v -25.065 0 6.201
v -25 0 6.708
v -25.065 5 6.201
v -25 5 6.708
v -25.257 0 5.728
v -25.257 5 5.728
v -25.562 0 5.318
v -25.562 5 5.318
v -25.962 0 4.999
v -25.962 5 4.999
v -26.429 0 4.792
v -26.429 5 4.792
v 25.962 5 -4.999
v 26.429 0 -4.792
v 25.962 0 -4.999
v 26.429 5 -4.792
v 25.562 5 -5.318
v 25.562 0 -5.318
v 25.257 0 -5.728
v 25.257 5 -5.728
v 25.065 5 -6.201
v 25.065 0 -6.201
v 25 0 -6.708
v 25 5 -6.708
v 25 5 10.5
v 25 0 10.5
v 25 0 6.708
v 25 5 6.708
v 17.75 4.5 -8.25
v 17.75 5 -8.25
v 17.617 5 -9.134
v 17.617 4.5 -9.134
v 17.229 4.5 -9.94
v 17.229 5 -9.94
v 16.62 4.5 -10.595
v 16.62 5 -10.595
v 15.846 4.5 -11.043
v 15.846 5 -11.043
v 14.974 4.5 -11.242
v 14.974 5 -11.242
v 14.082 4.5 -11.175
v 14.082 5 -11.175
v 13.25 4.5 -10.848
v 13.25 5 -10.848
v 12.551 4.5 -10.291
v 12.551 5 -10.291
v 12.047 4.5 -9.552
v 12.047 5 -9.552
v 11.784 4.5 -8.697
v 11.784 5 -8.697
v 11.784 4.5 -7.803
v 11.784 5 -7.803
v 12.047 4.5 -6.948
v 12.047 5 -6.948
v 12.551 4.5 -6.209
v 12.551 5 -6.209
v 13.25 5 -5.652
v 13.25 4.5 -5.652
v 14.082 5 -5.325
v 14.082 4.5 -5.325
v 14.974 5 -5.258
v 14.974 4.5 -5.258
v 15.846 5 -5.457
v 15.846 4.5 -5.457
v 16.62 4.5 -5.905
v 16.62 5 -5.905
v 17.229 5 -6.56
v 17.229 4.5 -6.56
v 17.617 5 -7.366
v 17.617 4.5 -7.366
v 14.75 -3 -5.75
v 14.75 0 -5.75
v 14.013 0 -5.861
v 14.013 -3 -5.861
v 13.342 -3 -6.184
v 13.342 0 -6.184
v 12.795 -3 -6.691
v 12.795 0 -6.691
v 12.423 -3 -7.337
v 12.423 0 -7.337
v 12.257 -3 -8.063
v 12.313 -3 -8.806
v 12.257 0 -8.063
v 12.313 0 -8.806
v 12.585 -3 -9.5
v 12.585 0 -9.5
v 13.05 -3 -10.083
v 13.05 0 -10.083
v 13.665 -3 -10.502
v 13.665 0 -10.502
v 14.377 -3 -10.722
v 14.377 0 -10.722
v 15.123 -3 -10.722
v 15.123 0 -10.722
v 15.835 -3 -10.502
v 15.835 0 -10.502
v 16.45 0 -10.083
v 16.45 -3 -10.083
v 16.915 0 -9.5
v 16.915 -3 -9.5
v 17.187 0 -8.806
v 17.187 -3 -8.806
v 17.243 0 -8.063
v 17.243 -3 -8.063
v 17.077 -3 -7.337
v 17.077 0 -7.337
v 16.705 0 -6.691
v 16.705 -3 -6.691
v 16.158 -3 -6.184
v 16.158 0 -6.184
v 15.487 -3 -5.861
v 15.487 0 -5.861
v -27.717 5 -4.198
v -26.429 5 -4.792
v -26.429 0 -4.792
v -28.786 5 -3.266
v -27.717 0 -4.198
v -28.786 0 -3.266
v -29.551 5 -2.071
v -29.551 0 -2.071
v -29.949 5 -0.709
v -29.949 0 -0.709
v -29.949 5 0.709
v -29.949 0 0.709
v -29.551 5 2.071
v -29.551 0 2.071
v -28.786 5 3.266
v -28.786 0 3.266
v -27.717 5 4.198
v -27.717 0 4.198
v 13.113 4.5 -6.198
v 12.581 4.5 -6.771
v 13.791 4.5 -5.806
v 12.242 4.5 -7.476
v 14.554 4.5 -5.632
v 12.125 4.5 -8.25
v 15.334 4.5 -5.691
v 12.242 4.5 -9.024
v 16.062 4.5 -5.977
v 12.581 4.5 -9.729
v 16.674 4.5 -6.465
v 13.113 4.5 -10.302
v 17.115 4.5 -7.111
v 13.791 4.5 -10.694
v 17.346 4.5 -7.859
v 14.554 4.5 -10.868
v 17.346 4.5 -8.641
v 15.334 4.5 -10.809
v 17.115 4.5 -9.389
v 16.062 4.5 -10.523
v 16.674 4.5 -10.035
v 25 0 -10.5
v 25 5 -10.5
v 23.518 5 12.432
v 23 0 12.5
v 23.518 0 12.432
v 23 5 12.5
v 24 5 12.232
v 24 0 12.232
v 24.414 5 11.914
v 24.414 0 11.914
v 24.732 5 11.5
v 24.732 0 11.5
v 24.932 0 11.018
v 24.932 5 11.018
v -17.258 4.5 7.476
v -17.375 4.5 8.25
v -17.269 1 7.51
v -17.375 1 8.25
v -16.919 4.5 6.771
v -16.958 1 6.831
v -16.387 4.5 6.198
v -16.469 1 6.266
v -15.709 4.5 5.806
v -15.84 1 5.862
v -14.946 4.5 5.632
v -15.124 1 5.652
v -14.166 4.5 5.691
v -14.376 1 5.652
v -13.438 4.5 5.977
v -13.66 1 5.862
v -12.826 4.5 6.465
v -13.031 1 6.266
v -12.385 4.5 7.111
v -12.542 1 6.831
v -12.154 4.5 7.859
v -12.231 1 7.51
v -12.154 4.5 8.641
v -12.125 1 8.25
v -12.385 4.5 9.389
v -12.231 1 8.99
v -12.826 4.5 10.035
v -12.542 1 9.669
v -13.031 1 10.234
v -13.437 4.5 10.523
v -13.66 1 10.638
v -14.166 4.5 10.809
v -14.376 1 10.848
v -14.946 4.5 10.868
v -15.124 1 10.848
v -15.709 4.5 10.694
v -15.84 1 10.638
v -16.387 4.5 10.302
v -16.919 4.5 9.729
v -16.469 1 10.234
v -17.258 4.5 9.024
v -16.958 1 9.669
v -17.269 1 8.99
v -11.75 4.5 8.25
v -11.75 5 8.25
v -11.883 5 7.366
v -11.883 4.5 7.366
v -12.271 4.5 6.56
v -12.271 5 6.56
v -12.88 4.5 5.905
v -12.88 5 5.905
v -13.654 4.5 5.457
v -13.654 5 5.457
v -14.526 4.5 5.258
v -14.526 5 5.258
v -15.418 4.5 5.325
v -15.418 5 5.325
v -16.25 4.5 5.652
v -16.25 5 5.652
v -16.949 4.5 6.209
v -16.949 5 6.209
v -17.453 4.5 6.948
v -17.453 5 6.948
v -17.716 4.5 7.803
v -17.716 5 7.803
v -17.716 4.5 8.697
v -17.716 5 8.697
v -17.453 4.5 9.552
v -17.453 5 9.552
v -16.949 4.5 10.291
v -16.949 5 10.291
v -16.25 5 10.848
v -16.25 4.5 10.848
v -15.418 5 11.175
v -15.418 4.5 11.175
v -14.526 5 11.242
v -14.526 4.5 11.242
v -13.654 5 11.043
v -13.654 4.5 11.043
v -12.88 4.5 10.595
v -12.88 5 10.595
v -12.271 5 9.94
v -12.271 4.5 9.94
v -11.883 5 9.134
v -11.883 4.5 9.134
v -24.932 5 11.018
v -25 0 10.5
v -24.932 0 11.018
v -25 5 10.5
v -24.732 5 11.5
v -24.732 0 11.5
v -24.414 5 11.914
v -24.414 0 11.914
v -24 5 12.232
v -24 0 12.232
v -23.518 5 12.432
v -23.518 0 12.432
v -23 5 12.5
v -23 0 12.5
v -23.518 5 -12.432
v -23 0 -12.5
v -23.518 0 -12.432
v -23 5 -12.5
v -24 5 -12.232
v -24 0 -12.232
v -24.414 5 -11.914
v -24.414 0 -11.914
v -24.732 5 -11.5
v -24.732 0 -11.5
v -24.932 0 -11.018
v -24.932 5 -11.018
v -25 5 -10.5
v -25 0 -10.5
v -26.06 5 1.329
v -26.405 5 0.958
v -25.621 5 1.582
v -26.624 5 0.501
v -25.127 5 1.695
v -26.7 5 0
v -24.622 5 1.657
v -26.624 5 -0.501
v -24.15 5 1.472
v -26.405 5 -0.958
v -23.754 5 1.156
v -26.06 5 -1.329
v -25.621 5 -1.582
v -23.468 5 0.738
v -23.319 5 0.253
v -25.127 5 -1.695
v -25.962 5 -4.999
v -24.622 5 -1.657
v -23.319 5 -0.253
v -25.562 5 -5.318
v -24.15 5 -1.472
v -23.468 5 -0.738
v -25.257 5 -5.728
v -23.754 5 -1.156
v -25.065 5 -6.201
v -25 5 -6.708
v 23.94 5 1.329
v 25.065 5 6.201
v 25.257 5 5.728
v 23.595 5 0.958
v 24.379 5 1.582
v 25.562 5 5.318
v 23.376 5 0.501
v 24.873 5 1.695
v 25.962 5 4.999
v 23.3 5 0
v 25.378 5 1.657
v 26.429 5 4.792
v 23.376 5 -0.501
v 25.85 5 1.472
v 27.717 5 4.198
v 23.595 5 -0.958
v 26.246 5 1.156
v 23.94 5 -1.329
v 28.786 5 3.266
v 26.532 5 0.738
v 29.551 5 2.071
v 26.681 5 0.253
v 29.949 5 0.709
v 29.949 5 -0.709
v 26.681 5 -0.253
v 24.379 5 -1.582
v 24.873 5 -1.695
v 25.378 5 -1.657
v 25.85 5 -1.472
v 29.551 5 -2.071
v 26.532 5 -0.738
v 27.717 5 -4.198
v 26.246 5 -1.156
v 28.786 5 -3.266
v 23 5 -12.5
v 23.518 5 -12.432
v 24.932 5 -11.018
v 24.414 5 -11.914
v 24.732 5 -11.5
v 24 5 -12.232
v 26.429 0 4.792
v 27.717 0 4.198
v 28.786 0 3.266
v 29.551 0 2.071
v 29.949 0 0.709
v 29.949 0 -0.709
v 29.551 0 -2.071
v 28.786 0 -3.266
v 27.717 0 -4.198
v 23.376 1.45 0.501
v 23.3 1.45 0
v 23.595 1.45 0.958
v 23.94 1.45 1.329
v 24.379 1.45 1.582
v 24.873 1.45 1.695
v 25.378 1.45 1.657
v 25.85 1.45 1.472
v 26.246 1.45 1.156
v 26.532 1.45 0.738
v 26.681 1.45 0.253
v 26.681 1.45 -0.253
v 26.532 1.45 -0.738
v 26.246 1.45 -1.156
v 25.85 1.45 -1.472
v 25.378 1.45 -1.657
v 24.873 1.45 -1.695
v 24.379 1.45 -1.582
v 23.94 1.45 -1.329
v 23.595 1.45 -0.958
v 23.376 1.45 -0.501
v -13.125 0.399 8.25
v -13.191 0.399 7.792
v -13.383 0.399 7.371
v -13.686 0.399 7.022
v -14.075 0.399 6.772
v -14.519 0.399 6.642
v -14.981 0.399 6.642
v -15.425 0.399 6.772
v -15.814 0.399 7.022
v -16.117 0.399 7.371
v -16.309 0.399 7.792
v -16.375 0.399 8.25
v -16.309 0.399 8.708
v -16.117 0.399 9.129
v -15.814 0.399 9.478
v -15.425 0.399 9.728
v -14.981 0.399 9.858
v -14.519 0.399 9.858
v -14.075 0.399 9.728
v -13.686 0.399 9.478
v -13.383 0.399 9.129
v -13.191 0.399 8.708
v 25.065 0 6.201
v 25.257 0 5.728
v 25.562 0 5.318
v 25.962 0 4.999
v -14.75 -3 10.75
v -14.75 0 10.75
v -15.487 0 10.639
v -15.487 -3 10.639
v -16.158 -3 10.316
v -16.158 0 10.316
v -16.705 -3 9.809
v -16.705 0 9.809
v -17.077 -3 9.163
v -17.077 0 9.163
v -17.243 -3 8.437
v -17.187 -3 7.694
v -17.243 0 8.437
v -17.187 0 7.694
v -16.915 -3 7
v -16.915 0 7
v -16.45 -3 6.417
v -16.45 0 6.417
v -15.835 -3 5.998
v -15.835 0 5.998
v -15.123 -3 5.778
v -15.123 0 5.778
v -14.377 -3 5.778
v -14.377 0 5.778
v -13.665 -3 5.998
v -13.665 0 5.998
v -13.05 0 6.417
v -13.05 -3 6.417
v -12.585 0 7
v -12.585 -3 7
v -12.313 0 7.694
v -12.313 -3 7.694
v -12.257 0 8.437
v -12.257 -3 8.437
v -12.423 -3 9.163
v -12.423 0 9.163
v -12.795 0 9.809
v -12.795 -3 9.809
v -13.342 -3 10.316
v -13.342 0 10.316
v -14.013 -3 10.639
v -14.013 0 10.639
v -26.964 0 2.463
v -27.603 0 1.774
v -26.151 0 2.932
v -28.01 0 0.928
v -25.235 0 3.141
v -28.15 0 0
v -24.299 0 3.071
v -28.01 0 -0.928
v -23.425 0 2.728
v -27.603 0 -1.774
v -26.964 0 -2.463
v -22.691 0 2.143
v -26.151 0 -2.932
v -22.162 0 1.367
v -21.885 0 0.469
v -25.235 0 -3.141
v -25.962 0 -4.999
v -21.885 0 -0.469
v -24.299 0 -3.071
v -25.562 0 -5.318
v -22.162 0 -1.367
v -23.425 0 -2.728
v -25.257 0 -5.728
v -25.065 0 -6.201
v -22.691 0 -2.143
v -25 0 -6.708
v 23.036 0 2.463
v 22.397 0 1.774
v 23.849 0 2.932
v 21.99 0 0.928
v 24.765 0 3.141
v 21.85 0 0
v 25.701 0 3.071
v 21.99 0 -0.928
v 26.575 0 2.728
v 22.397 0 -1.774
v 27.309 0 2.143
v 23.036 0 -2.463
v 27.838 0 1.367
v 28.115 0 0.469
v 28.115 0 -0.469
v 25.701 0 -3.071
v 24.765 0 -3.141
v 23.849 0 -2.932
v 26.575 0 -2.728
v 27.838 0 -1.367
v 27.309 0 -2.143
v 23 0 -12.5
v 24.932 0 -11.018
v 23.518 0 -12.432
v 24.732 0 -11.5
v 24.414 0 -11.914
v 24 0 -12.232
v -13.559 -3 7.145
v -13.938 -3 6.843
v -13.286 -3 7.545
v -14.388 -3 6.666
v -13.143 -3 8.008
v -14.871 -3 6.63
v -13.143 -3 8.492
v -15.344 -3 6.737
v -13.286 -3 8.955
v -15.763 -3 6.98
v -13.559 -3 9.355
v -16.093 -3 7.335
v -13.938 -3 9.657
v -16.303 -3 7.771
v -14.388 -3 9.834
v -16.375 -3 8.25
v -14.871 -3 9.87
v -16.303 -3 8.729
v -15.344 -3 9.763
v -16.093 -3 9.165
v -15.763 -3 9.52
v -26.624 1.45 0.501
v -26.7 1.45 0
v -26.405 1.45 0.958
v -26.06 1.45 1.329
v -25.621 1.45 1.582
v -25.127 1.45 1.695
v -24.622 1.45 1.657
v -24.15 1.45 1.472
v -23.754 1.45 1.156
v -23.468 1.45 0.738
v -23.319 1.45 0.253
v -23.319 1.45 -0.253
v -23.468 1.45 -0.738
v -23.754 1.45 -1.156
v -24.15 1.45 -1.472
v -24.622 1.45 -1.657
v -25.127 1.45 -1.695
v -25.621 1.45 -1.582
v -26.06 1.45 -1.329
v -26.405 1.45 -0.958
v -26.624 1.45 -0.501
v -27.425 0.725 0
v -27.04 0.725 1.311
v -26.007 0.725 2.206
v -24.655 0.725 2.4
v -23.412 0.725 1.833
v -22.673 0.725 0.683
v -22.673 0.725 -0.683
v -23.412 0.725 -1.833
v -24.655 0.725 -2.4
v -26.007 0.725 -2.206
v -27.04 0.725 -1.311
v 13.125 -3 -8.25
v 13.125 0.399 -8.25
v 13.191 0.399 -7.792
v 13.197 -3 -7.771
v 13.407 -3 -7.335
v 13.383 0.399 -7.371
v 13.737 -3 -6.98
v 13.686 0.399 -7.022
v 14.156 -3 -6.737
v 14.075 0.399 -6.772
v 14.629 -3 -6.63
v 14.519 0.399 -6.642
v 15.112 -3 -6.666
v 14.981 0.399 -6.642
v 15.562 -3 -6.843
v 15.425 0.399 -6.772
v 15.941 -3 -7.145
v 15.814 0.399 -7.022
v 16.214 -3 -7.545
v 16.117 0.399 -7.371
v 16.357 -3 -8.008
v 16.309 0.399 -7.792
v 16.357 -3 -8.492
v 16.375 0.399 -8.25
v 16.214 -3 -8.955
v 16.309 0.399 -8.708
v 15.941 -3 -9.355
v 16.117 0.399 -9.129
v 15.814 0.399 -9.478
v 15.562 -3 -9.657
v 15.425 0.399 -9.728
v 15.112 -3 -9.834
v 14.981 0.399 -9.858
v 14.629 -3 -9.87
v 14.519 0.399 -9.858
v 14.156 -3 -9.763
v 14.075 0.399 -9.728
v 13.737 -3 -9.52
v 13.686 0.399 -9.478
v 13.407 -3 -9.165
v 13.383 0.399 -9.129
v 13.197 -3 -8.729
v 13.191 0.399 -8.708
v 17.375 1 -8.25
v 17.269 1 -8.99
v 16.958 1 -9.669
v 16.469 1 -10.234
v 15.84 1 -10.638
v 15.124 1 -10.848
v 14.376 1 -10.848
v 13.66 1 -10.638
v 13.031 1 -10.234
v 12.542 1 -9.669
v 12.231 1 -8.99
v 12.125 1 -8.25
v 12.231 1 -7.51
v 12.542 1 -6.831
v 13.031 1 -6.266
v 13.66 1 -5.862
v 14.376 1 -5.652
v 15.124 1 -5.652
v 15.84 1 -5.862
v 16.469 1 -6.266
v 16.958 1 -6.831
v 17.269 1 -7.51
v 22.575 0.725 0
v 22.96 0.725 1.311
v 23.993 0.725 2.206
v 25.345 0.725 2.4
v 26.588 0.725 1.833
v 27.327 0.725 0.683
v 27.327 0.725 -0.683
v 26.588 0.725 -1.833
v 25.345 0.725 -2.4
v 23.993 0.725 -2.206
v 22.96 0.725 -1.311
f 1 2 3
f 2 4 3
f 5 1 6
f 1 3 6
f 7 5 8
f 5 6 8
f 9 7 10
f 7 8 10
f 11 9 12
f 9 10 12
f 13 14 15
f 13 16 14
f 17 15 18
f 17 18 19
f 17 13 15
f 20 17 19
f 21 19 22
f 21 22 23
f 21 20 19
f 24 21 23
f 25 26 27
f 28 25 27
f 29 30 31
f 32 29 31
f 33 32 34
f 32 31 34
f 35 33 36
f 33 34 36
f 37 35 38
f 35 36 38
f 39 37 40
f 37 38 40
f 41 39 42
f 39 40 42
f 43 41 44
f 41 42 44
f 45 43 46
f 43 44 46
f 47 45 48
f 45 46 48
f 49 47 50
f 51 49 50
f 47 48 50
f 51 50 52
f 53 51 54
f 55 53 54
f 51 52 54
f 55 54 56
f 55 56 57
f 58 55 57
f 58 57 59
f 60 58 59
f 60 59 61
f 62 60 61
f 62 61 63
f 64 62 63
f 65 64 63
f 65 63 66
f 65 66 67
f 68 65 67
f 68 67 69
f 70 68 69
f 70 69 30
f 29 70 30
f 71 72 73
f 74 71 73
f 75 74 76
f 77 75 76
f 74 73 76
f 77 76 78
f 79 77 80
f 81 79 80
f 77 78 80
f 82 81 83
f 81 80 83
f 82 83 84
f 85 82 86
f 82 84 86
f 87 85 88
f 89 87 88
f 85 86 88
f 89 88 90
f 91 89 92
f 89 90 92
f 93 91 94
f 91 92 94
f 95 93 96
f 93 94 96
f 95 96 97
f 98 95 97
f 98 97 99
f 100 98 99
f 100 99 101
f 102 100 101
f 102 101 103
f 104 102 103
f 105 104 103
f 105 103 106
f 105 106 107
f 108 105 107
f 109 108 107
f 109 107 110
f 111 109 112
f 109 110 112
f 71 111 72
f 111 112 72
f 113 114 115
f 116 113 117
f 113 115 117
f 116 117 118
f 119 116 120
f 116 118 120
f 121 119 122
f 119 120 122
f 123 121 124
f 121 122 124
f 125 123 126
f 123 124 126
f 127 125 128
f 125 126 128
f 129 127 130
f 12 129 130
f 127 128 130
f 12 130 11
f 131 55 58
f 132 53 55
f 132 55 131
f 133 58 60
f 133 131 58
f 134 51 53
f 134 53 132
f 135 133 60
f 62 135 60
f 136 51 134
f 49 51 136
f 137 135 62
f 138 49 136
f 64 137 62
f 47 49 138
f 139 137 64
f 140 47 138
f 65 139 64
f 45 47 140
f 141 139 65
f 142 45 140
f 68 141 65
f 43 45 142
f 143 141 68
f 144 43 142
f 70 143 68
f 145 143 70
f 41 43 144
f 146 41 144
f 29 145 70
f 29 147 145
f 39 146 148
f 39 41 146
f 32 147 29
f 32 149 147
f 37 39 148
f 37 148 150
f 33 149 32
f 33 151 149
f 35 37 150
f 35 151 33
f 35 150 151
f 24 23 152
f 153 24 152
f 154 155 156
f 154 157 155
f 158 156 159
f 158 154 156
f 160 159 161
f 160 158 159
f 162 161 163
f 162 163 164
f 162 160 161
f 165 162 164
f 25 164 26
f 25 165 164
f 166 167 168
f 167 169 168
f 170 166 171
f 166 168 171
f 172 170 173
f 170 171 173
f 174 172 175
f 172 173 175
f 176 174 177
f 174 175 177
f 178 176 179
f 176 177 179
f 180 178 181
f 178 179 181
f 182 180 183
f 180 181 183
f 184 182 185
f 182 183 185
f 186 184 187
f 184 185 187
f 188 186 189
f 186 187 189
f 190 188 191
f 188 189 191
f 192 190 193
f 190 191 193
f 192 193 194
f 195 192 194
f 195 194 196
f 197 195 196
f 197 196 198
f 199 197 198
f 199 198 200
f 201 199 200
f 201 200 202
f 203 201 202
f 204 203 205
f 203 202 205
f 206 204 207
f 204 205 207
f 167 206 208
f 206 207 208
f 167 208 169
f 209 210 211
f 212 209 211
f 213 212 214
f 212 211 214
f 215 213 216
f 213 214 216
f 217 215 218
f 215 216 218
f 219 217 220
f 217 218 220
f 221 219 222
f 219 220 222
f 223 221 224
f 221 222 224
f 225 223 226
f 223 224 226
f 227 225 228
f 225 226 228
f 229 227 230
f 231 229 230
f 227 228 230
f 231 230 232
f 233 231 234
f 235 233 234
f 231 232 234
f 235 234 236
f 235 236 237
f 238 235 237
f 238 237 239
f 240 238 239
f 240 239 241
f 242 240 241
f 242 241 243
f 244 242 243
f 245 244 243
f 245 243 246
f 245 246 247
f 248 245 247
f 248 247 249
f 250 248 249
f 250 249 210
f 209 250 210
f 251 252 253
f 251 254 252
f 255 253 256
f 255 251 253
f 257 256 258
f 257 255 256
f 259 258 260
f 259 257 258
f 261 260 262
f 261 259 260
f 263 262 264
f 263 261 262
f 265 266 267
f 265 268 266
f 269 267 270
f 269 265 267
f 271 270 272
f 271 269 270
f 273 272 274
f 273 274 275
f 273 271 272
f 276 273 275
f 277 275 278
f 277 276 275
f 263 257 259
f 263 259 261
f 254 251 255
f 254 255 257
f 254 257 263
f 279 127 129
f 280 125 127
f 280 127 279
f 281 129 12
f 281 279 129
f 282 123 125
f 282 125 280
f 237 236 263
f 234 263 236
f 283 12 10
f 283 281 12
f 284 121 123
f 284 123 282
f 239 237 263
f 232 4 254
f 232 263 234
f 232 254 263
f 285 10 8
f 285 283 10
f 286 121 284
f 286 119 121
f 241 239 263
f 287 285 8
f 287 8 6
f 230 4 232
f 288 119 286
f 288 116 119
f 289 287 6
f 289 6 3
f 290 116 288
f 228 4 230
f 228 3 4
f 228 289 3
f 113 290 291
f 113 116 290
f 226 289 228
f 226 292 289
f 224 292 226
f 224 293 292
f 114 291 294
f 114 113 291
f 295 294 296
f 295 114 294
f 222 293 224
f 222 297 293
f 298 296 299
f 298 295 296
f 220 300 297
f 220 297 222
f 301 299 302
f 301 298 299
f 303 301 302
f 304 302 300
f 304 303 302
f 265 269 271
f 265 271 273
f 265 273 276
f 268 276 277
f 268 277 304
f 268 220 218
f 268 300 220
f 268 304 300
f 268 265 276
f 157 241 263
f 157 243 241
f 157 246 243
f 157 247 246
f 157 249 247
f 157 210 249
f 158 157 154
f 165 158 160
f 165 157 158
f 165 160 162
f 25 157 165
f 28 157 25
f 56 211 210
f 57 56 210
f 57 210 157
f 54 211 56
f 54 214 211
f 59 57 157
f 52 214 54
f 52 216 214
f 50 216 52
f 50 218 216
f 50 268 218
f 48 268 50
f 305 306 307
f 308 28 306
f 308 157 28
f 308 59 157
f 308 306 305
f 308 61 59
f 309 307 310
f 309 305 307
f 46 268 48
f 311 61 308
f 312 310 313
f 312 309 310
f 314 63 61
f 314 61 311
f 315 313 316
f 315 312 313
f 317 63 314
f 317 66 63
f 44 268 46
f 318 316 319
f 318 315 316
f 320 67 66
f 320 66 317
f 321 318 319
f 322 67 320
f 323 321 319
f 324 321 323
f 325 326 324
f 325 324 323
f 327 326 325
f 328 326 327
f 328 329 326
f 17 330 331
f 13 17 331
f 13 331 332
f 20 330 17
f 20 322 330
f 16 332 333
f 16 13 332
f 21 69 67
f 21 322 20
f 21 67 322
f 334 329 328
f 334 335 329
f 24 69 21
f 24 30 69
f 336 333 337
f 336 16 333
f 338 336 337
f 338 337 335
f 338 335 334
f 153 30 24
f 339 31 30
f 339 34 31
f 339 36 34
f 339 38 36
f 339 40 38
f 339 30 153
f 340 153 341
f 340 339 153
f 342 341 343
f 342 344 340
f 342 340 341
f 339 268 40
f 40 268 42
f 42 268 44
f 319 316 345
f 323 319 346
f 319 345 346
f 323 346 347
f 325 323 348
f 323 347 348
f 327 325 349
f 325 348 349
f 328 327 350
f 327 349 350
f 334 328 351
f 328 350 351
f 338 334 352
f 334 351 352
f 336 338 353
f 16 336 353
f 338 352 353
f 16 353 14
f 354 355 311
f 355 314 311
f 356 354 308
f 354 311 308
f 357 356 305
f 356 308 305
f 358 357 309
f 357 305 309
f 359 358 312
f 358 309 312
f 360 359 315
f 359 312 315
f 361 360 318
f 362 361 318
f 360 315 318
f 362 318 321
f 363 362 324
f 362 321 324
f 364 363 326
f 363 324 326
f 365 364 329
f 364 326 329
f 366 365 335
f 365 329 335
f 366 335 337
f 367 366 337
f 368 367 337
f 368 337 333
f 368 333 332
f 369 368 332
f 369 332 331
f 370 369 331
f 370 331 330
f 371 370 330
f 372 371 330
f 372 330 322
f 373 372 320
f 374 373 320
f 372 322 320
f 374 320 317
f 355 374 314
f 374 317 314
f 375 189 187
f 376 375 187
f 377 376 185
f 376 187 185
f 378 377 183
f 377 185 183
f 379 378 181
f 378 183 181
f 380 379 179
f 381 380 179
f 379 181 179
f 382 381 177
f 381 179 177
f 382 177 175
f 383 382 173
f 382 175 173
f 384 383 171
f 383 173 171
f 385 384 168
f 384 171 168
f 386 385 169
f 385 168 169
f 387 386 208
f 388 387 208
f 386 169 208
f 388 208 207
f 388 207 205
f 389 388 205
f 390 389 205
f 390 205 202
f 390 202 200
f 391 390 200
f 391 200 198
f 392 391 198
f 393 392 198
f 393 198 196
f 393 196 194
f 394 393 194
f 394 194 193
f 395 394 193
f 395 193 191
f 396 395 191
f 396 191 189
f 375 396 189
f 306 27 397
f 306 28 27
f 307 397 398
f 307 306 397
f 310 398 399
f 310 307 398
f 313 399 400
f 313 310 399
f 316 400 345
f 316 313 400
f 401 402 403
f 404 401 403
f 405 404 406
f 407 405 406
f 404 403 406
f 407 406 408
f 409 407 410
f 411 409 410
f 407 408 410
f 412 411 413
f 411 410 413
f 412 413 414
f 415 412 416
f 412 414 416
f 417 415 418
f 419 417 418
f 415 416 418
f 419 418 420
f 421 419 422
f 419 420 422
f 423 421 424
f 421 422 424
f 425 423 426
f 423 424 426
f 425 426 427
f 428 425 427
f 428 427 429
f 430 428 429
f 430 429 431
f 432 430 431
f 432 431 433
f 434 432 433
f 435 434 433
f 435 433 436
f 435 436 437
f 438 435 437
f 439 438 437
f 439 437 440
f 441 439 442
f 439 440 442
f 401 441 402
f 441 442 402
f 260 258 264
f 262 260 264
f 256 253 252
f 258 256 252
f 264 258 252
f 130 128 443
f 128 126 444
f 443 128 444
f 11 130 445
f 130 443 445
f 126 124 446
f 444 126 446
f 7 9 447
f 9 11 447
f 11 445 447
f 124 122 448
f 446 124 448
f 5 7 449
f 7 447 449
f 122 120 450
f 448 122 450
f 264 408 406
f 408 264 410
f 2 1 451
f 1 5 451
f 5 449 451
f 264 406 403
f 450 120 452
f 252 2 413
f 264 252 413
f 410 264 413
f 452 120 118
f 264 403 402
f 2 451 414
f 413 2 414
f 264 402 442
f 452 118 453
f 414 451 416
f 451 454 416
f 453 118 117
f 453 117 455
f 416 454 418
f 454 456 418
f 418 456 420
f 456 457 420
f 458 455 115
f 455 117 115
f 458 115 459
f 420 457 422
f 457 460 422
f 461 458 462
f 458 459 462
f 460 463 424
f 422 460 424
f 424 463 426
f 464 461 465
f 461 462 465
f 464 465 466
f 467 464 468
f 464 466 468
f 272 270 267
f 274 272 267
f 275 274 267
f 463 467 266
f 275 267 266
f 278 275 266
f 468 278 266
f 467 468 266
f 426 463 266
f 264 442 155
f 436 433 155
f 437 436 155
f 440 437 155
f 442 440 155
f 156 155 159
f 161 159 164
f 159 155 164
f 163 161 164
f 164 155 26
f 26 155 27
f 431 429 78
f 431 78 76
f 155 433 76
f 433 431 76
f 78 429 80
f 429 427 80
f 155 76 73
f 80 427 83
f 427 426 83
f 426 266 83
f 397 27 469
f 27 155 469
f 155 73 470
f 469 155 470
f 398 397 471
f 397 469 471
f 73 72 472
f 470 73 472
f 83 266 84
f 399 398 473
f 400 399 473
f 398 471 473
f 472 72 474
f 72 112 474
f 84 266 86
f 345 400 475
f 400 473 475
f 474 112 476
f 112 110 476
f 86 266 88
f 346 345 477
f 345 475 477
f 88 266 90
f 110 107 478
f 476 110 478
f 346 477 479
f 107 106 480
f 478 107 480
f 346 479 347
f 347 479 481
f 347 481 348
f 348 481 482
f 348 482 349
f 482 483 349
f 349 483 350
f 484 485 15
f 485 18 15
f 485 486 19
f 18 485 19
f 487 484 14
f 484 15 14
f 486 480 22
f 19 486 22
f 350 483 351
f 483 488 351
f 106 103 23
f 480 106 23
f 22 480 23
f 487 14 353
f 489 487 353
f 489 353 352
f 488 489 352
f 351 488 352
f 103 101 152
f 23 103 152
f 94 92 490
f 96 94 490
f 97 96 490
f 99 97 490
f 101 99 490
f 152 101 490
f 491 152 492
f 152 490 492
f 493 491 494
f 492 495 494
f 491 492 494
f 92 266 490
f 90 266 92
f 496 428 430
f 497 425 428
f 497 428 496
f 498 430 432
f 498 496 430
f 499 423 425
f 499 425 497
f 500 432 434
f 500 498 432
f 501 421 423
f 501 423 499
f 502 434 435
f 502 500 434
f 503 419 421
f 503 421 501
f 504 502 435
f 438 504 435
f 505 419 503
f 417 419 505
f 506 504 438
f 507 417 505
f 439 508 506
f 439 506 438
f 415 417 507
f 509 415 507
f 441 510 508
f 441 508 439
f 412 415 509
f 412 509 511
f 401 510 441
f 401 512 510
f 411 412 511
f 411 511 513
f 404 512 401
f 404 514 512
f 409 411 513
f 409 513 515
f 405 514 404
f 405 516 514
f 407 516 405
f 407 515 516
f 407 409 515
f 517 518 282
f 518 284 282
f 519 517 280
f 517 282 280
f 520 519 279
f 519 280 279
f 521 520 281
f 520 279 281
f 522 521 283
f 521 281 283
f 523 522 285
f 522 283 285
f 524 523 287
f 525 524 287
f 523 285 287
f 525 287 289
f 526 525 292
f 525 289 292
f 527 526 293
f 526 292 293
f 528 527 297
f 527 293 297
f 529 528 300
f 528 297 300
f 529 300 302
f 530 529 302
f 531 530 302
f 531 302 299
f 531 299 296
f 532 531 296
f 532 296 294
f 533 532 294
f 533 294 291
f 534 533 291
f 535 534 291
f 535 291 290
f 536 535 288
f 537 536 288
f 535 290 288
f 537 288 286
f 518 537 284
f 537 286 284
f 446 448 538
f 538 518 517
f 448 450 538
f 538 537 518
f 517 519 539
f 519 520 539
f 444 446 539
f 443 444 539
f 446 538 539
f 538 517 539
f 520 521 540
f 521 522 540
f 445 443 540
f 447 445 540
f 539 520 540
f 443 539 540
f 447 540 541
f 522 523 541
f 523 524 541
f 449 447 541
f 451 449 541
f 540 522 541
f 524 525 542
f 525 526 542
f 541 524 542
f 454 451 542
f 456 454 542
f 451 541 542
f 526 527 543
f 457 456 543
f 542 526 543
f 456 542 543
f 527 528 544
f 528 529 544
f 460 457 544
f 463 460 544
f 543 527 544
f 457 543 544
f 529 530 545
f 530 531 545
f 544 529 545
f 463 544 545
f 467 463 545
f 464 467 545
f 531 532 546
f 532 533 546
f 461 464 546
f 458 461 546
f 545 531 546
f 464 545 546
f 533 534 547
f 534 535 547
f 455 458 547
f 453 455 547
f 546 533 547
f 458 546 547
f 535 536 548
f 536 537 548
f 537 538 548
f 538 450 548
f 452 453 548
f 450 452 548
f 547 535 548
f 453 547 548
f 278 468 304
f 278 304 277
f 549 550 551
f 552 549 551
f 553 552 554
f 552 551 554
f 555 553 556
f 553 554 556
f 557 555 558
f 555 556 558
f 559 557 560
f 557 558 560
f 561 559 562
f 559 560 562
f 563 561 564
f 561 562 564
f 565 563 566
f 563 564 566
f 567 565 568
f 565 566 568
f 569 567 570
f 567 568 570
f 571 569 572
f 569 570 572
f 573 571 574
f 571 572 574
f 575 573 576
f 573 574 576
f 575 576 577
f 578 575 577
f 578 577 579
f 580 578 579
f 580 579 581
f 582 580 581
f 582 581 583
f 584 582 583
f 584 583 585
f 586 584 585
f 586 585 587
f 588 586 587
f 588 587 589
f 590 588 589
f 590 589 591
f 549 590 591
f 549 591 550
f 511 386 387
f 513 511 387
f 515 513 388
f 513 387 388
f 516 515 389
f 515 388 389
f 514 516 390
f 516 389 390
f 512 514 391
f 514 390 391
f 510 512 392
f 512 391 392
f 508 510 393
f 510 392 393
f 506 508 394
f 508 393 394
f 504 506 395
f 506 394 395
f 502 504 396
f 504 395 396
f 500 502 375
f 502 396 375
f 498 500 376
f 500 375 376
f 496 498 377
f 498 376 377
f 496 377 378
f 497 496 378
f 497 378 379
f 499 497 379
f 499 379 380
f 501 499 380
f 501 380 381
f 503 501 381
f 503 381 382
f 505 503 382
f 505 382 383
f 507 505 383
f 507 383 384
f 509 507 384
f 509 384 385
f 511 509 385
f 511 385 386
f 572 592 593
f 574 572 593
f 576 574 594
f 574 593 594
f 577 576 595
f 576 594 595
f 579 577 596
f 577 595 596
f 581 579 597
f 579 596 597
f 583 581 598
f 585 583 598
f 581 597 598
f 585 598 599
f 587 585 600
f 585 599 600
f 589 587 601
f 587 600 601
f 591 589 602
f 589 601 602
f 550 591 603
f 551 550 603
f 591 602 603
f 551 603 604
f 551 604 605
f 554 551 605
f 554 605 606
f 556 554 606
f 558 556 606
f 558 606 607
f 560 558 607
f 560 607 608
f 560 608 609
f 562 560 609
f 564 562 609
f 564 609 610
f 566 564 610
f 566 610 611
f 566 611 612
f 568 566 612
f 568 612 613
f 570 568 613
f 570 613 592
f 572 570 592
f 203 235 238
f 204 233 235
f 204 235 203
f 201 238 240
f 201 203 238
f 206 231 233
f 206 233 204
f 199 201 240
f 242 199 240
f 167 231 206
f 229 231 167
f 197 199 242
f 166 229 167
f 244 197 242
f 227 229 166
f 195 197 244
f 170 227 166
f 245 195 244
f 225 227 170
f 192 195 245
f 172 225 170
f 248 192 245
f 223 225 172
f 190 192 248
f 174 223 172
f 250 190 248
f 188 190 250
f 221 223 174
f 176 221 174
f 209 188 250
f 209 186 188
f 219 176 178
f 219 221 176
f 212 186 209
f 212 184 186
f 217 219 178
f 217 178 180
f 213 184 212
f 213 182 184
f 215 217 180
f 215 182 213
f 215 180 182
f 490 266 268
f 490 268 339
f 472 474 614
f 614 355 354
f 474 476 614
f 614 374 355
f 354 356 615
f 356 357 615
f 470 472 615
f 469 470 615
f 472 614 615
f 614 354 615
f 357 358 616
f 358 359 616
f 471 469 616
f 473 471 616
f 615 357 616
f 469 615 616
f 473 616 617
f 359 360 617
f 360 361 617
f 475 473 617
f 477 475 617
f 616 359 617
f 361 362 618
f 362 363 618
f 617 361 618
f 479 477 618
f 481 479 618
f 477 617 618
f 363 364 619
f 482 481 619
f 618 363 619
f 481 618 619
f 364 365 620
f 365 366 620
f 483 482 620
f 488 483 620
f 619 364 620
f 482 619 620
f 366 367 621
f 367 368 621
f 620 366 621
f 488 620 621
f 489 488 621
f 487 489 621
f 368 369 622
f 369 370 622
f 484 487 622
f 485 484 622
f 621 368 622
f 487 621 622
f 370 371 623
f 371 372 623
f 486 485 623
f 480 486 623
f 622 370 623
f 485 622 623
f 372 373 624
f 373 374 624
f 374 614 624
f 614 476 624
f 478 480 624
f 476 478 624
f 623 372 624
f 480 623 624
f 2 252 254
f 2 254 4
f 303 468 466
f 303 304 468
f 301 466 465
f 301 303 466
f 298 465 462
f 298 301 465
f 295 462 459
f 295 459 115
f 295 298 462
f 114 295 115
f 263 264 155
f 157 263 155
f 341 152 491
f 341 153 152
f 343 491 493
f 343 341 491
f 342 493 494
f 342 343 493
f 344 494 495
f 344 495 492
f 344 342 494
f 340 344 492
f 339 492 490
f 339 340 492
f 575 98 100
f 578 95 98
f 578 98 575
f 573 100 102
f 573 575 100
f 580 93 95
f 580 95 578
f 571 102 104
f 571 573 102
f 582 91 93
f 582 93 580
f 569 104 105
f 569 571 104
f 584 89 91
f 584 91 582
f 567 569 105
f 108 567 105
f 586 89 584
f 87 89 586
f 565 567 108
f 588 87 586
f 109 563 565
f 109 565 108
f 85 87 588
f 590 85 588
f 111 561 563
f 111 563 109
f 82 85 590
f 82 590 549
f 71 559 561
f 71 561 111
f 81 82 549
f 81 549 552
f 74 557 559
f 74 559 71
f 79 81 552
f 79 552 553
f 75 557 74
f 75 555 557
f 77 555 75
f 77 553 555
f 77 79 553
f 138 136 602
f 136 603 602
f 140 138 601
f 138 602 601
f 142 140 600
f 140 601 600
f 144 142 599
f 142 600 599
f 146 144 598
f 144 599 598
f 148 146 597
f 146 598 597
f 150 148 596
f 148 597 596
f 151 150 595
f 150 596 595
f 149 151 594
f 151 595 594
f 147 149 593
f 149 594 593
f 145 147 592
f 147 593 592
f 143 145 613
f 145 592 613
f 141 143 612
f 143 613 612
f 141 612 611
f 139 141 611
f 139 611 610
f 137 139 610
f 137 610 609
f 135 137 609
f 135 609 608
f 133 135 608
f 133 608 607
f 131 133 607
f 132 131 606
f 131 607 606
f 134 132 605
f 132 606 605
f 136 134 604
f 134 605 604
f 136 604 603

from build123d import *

# Parameters (mm, degrees)
SKETCH1_W                                       = 50
SKETCH1_H                                       = 7.5
BOSS_EXTRUDE1_DEPTH                             = 5
FILLET1_R                                       = 2
SKETCH2_R                                       = 2.5
BOSS_EXTRUDE2_DEPTH                             = 3
CBORE_FOR_M3_SHCS1_D                            = 5.25
CBORE_FOR_M3_SHCS1_DEPTH                        = 4
CBORE_FOR_M3_SHCS1_CBORE_D                      = 6
CBORE_FOR_M3_SHCS1_CBORE_DEPTH                  = 0.5
CBORE_FOR_M3_SHCS1_TIP                          = 1.577259125
CSK_FOR_M3_FLAT_HEAD_MACHINE_SCREW1_D           = 3.4
CSK_FOR_M3_FLAT_HEAD_MACHINE_SCREW1_CSINK_D     = 6.3
CSK_FOR_M3_FLAT_HEAD_MACHINE_SCREW1_CSINK_ANGLE = 90
M3_CLEARANCE_HOLE1_D                            = 3.25
M3_CLEARANCE_HOLE1_DEPTH                        = 4
M3_CLEARANCE_HOLE1_TIP                          = 0.976398506


with BuildPart() as part:
    # Sketch1 → Boss-Extrude1 (new body)
    with BuildSketch(Plane(origin=(0, 0, 0), x_dir=(1, 0, 0), z_dir=(0, 1, 0))):
        with Locations((0, -8.75)):
            Rectangle(SKETCH1_W, SKETCH1_H)
        with BuildLine():
            Line((-25, 2.625), (-25, 5))
            ThreePointArc((-25, 5), (-30, 0), (-25, -5))
            Line((-25, -5), (-25, -2.625))
            ThreePointArc((-25, -2.625), (-27.625, 0), (-25, 2.625))
        make_face()
        with BuildLine():
            Line((25, 5), (-25, 5))
            Line((-25, 5), (-25, 2.625))
            ThreePointArc((-25, 2.625), (-23.143844699, 1.856155301), (-22.375, 0))
            ThreePointArc((-22.375, 0), (-23.143844699, -1.856155301), (-25, -2.625))
            Line((-25, -2.625), (-25, -5))
            Line((-25, -5), (25, -5))
            Line((25, -5), (25, -2.625))
            ThreePointArc((25, -2.625), (22.375, 0), (25, 2.625))
            Line((25, 2.625), (25, 5))
        make_face()
        with Locations((0, 8.75)):
            Rectangle(SKETCH1_W, SKETCH1_H)
        with BuildLine():
            ThreePointArc((25, -5), (30, 0), (25, 5))
            Line((25, 5), (25, 2.625))
            ThreePointArc((25, 2.625), (26.856155301, 1.856155301), (27.625, 0))
            ThreePointArc((27.625, 0), (26.856155301, -1.856155301), (25, -2.625))
            Line((25, -2.625), (25, -5))
        make_face()
        with BuildLine():
            ThreePointArc((-22.375, 0), (-23.143844699, 1.856155301), (-25, 2.625))
            Line((-25, 2.625), (-25, -2.625))
            ThreePointArc((-25, -2.625), (-23.143844699, -1.856155301), (-22.375, 0))
        make_face()
        with BuildLine():
            Line((-25, -2.625), (-25, 2.625))
            ThreePointArc((-25, 2.625), (-27.625, 0), (-25, -2.625))
        make_face()
        with BuildLine():
            ThreePointArc((27.625, 0), (26.856155301, 1.856155301), (25, 2.625))
            Line((25, 2.625), (25, -2.625))
            ThreePointArc((25, -2.625), (26.856155301, -1.856155301), (27.625, 0))
        make_face()
        with BuildLine():
            Line((25, -2.625), (25, 2.625))
            ThreePointArc((25, 2.625), (22.375, 0), (25, -2.625))
        make_face()
    extrude(amount=BOSS_EXTRUDE1_DEPTH)

    # Fillet1
    fillet1_edges = [part.edges().sort_by_distance(p)[0] for p in [
        (25, 2.5, 12.5),
        (-25, 2.5, 12.5),
        (-25, 2.5, 5),
        (-25, 2.5, -5),
        (-25, 2.5, -12.5),
        (25, 2.5, -12.5),
        (25, 2.5, -5),
        (25, 2.5, 5),
    ]]
    fillet(fillet1_edges, radius=FILLET1_R)

    # Sketch2 → Boss-Extrude2 (add)
    with BuildSketch(Plane.XZ):
        with Locations(Location((-14.75, 8.25, 0), (0, 0, 90))):
            Circle(SKETCH2_R)
        with Locations(Location((14.75, -8.25, 0), (0, 0, 90))):
            Circle(SKETCH2_R)
    extrude(amount=BOSS_EXTRUDE2_DEPTH)

    # CBORE for M3 SHCS1
    with Locations(Plane(origin=(0, 5, 0), x_dir=(1, 0, 0), z_dir=(0, 1, 0))):
        with Locations((-14.75, -8.25), (14.75, 8.25)):
            CounterBoreHole(CBORE_FOR_M3_SHCS1_D / 2, CBORE_FOR_M3_SHCS1_CBORE_D / 2, CBORE_FOR_M3_SHCS1_CBORE_DEPTH, depth=CBORE_FOR_M3_SHCS1_DEPTH)
            with Locations((0, 0, -(CBORE_FOR_M3_SHCS1_DEPTH + CBORE_FOR_M3_SHCS1_TIP / 2))):  # 118° drill point
                Cone(0, CBORE_FOR_M3_SHCS1_D / 2, CBORE_FOR_M3_SHCS1_TIP, mode=Mode.SUBTRACT)

    # CSK for M3 Flat Head Machine Screw1 (through all)
    with Locations(Plane.XZ):
        with Locations((-25, 0), (25, 0)):
            CounterSinkHole(CSK_FOR_M3_FLAT_HEAD_MACHINE_SCREW1_D / 2, CSK_FOR_M3_FLAT_HEAD_MACHINE_SCREW1_CSINK_D / 2, counter_sink_angle=CSK_FOR_M3_FLAT_HEAD_MACHINE_SCREW1_CSINK_ANGLE)

    # M3 Clearance Hole1
    with Locations(Plane.XZ.offset(3)):
        with Locations((-14.75, 8.25), (14.75, -8.25)):
            Hole(M3_CLEARANCE_HOLE1_D / 2, depth=M3_CLEARANCE_HOLE1_DEPTH)
            with Locations((0, 0, -(M3_CLEARANCE_HOLE1_DEPTH + M3_CLEARANCE_HOLE1_TIP / 2))):  # 118° drill point
                Cone(0, M3_CLEARANCE_HOLE1_D / 2, M3_CLEARANCE_HOLE1_TIP, mode=Mode.SUBTRACT)


solid = part.part
